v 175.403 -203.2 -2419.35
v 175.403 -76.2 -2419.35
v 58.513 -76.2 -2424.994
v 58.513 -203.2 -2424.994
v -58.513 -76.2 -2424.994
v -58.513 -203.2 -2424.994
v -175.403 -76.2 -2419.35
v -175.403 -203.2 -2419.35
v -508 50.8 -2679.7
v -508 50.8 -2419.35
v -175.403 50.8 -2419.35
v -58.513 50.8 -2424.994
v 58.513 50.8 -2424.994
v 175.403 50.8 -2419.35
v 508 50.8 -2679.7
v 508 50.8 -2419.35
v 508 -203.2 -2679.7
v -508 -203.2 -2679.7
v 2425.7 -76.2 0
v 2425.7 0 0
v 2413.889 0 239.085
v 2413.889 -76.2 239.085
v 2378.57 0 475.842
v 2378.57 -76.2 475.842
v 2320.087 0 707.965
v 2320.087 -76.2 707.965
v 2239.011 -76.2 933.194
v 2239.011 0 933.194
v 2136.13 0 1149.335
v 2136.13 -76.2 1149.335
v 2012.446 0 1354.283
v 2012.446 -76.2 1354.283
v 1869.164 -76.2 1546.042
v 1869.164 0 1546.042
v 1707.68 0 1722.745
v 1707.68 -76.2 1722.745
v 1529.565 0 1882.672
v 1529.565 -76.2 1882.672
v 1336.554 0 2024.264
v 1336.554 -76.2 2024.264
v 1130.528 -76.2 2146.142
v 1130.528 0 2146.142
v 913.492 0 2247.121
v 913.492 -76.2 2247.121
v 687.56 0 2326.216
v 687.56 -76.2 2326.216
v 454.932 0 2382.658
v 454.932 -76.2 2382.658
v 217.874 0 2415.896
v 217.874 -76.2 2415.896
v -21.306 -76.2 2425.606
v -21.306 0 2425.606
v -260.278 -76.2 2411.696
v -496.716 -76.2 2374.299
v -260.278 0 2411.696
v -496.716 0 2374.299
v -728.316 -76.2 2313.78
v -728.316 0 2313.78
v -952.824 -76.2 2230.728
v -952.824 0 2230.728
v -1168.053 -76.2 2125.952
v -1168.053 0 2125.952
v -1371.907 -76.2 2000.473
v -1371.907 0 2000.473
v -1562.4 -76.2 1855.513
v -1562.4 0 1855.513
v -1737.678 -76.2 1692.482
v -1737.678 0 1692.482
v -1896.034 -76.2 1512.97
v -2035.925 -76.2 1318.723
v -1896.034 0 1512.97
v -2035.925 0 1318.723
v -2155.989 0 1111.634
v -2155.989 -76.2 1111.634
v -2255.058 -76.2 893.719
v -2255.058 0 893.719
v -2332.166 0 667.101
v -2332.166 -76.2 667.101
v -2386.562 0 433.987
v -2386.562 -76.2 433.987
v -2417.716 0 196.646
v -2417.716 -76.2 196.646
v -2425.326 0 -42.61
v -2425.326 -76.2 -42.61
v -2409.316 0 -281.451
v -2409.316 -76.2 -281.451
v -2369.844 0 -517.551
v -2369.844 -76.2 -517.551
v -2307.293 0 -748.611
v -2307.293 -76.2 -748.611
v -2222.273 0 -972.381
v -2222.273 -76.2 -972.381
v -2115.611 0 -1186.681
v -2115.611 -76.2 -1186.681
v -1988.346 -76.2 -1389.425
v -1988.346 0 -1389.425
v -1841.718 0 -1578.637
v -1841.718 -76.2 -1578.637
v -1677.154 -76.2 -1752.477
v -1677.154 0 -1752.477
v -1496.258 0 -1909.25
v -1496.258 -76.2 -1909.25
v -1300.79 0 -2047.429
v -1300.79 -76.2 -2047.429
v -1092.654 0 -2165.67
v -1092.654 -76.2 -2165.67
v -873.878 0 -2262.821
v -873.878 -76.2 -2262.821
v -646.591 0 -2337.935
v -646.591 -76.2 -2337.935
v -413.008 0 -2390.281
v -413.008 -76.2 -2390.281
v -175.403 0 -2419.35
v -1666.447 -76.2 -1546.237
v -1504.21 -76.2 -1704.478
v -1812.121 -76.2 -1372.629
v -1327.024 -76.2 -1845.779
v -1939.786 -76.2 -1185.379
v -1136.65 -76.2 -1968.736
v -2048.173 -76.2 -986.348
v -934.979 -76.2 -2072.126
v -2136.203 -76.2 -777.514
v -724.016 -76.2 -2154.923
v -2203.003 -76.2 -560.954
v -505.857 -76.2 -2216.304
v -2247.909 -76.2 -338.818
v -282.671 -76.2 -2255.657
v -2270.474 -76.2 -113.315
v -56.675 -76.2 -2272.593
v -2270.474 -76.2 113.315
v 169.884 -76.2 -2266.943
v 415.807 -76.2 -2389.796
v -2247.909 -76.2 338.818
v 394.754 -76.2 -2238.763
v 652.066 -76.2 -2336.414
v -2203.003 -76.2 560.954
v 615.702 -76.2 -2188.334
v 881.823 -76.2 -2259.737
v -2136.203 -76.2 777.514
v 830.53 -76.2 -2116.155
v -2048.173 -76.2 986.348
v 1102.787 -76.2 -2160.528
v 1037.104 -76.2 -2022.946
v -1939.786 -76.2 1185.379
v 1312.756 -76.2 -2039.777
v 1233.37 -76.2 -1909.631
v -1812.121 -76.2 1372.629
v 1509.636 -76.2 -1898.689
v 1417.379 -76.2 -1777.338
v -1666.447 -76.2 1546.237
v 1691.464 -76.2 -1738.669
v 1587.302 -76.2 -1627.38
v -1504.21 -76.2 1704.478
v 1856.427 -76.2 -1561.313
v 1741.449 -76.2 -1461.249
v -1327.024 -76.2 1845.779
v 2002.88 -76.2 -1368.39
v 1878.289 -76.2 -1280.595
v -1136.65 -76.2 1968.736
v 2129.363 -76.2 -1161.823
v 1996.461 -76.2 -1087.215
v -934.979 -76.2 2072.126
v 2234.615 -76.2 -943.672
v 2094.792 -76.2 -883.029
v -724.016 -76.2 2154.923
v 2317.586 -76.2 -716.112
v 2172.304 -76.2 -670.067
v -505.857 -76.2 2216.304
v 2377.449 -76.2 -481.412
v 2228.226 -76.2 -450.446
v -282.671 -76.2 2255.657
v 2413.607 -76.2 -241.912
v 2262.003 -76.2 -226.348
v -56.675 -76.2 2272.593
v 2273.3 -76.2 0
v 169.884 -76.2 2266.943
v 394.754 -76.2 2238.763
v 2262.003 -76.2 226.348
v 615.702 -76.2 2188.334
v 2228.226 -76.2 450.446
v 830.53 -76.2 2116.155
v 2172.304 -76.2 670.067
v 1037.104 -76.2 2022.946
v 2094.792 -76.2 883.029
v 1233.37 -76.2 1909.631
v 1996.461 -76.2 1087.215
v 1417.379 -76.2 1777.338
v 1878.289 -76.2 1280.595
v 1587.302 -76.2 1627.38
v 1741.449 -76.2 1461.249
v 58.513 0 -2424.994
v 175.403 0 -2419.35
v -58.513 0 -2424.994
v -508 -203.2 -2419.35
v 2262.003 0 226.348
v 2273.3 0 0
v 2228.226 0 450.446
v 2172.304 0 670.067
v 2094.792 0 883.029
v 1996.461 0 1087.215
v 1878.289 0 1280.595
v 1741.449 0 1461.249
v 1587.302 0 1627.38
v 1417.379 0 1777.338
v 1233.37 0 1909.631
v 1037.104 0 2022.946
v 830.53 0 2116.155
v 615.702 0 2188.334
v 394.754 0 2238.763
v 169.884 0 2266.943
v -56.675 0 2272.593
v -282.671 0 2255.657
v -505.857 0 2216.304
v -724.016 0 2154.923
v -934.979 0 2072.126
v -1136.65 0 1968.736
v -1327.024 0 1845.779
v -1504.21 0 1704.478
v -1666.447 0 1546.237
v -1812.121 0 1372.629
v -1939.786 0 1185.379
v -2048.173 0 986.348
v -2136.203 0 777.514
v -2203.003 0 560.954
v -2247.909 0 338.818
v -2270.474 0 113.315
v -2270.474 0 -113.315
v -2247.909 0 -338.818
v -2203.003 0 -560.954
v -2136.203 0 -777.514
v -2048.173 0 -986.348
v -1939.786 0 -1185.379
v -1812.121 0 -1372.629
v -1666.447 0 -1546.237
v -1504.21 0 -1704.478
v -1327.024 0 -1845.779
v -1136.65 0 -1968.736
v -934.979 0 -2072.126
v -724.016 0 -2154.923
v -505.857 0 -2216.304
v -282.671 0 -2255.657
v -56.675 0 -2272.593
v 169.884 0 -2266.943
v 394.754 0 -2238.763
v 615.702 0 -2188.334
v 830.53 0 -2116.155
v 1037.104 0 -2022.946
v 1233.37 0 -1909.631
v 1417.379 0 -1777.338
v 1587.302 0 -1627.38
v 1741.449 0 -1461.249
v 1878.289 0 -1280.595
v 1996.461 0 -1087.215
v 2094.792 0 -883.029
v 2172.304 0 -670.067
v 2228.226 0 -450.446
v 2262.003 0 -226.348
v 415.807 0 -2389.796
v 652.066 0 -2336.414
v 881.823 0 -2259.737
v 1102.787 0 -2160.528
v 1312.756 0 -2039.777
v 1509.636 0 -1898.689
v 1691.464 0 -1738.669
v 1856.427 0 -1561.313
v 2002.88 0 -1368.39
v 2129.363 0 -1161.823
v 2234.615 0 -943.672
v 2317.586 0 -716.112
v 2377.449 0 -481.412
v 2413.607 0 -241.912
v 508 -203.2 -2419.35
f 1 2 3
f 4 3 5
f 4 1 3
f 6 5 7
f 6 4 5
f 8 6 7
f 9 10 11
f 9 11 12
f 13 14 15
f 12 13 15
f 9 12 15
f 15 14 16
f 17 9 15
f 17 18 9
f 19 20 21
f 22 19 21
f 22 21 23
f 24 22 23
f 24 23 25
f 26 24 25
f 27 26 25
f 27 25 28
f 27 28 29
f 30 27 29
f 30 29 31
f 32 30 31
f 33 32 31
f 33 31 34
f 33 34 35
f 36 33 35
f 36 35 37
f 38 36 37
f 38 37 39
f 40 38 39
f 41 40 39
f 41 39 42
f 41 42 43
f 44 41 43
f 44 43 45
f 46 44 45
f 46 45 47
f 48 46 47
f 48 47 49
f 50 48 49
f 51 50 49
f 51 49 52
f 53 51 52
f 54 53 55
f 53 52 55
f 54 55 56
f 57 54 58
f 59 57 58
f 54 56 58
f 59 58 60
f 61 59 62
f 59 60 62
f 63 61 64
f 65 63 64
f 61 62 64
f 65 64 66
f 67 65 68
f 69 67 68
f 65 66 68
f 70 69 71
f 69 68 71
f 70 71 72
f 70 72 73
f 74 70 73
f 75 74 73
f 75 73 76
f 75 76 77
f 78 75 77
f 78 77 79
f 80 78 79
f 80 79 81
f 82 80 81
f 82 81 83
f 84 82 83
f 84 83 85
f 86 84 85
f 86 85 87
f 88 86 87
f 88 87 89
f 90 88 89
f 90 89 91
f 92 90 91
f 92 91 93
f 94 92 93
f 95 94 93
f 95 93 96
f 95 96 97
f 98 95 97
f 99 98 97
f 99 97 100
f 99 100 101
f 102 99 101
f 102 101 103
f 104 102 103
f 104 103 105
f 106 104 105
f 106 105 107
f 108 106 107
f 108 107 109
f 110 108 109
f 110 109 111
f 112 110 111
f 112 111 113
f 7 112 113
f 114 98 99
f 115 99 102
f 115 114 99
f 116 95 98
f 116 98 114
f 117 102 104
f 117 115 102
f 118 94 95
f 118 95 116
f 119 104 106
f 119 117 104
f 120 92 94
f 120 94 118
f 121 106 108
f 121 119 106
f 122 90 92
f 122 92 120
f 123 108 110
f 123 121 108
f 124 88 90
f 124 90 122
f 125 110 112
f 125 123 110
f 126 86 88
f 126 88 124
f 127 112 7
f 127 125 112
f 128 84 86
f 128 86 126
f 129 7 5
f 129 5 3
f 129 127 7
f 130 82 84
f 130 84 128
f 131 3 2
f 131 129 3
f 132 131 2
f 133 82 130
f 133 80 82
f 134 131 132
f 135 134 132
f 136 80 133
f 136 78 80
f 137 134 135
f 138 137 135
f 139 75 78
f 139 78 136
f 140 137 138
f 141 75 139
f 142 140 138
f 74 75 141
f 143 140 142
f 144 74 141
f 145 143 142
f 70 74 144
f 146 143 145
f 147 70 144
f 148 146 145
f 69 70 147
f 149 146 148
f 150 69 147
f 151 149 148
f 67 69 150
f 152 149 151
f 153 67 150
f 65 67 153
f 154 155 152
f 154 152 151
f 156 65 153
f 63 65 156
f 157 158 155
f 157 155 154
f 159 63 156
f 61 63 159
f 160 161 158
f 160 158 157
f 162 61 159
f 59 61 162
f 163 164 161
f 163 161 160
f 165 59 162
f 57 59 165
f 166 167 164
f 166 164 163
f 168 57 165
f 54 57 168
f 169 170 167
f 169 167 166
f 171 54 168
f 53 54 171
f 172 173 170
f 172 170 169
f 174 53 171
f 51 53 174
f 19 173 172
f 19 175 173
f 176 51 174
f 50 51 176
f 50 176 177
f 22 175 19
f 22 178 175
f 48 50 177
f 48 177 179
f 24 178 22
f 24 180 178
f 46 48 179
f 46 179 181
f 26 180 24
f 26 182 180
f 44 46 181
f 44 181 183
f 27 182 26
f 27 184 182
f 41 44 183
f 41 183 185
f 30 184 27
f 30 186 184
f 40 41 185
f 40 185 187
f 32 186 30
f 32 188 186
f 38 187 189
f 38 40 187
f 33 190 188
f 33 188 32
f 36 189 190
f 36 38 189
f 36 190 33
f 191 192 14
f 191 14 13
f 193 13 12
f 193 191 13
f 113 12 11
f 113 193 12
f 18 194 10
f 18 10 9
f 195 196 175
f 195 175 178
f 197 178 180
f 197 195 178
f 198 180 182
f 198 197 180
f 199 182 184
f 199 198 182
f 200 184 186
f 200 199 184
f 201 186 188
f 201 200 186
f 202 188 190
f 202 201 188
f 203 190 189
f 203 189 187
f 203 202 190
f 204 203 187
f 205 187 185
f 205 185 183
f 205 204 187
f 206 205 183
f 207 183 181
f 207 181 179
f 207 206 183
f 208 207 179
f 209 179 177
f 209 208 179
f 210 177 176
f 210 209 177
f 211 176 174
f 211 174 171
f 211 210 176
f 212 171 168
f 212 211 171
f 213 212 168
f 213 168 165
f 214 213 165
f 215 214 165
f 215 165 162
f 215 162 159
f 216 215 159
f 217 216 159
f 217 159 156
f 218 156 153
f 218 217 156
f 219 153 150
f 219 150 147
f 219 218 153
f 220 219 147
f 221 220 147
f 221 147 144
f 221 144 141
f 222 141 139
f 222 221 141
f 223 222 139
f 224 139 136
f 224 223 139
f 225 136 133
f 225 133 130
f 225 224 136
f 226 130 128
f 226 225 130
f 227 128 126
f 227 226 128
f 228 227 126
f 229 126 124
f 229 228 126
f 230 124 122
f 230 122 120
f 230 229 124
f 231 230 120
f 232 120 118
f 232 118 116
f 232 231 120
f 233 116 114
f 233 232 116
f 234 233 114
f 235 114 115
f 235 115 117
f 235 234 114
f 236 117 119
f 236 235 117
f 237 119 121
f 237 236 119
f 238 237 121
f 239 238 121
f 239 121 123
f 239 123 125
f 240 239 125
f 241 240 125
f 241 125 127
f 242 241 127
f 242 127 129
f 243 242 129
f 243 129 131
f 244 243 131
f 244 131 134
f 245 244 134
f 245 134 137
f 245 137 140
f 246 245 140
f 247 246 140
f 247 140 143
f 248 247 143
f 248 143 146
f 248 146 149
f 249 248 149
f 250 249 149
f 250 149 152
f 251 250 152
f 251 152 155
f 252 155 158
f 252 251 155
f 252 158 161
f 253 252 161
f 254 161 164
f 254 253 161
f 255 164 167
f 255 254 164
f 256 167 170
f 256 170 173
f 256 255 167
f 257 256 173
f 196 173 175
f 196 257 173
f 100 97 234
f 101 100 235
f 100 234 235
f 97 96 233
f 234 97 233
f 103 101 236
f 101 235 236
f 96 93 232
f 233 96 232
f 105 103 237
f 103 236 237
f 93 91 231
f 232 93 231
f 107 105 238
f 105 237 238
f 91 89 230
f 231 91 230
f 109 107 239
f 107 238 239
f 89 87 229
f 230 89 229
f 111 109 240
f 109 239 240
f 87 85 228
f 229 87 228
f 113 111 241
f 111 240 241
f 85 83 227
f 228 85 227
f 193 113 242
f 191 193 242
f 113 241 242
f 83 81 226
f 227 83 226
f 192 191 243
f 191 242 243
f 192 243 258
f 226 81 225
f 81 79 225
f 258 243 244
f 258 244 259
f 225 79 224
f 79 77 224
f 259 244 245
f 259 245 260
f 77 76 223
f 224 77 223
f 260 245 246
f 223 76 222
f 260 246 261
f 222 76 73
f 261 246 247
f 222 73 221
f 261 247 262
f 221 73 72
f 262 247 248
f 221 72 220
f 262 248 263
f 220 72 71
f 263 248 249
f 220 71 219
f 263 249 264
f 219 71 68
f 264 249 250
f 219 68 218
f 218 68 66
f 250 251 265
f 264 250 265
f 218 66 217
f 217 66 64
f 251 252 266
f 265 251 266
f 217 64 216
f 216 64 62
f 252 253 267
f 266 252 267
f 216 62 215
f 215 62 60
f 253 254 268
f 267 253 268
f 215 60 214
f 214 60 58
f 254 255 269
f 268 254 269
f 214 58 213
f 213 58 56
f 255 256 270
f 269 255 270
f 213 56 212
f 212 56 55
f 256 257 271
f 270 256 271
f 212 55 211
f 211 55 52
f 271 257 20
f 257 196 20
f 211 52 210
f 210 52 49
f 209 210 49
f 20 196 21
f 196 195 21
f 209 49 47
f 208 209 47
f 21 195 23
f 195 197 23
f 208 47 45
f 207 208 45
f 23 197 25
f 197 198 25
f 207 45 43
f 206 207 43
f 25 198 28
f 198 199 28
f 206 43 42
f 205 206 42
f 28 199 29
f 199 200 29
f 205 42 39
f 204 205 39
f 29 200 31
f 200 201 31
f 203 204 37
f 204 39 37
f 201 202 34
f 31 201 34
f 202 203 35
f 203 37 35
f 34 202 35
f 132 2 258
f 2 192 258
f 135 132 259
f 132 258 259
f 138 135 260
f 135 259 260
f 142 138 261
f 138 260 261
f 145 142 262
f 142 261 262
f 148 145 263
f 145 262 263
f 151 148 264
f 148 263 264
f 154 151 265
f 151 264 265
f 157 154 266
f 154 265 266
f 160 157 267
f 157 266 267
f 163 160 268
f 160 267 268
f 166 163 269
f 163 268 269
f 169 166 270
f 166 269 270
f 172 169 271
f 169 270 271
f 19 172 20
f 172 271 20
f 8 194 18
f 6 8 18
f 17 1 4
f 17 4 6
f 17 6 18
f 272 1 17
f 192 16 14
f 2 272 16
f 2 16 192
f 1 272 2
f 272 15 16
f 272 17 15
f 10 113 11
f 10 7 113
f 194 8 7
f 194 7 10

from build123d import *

# Parameters (mm, degrees)
F0_R     = 2425.7
F0_R_2   = 2273.3
F1_DEPTH = 76.2
F3_DEPTH = 127


# Not quite as in the source:
# - a feature of the source that left no trace in its solid (it failed there, or was rolled back) is left out


with BuildPart() as f1:
    # F0 (on Front) → F1 (new body)
    with BuildSketch(Plane.XZ):
        Circle(F0_R)
        Circle(F0_R_2, mode=Mode.SUBTRACT)
    extrude(amount=F1_DEPTH)

    # F2 (on face) → F3 (join, symmetric)
    with BuildSketch(Plane.XZ.offset(76.2)):
        with BuildLine():
            Line((508, -2419.35), (175.402586925, -2419.35))
            ThreePointArc((175.402586925, -2419.35), (0, -2425.7), (-175.402586925, -2419.35))
            Line((-175.402586925, -2419.35), (-508, -2419.35))
            Line((-508, -2419.35), (-508, -2679.7))
            Line((-508, -2679.7), (0, -2679.7))
            Line((0, -2679.7), (508, -2679.7))
            Line((508, -2679.7), (508, -2419.35))
        make_face()
    extrude(amount=F3_DEPTH, both=True)


solid = f1.part
